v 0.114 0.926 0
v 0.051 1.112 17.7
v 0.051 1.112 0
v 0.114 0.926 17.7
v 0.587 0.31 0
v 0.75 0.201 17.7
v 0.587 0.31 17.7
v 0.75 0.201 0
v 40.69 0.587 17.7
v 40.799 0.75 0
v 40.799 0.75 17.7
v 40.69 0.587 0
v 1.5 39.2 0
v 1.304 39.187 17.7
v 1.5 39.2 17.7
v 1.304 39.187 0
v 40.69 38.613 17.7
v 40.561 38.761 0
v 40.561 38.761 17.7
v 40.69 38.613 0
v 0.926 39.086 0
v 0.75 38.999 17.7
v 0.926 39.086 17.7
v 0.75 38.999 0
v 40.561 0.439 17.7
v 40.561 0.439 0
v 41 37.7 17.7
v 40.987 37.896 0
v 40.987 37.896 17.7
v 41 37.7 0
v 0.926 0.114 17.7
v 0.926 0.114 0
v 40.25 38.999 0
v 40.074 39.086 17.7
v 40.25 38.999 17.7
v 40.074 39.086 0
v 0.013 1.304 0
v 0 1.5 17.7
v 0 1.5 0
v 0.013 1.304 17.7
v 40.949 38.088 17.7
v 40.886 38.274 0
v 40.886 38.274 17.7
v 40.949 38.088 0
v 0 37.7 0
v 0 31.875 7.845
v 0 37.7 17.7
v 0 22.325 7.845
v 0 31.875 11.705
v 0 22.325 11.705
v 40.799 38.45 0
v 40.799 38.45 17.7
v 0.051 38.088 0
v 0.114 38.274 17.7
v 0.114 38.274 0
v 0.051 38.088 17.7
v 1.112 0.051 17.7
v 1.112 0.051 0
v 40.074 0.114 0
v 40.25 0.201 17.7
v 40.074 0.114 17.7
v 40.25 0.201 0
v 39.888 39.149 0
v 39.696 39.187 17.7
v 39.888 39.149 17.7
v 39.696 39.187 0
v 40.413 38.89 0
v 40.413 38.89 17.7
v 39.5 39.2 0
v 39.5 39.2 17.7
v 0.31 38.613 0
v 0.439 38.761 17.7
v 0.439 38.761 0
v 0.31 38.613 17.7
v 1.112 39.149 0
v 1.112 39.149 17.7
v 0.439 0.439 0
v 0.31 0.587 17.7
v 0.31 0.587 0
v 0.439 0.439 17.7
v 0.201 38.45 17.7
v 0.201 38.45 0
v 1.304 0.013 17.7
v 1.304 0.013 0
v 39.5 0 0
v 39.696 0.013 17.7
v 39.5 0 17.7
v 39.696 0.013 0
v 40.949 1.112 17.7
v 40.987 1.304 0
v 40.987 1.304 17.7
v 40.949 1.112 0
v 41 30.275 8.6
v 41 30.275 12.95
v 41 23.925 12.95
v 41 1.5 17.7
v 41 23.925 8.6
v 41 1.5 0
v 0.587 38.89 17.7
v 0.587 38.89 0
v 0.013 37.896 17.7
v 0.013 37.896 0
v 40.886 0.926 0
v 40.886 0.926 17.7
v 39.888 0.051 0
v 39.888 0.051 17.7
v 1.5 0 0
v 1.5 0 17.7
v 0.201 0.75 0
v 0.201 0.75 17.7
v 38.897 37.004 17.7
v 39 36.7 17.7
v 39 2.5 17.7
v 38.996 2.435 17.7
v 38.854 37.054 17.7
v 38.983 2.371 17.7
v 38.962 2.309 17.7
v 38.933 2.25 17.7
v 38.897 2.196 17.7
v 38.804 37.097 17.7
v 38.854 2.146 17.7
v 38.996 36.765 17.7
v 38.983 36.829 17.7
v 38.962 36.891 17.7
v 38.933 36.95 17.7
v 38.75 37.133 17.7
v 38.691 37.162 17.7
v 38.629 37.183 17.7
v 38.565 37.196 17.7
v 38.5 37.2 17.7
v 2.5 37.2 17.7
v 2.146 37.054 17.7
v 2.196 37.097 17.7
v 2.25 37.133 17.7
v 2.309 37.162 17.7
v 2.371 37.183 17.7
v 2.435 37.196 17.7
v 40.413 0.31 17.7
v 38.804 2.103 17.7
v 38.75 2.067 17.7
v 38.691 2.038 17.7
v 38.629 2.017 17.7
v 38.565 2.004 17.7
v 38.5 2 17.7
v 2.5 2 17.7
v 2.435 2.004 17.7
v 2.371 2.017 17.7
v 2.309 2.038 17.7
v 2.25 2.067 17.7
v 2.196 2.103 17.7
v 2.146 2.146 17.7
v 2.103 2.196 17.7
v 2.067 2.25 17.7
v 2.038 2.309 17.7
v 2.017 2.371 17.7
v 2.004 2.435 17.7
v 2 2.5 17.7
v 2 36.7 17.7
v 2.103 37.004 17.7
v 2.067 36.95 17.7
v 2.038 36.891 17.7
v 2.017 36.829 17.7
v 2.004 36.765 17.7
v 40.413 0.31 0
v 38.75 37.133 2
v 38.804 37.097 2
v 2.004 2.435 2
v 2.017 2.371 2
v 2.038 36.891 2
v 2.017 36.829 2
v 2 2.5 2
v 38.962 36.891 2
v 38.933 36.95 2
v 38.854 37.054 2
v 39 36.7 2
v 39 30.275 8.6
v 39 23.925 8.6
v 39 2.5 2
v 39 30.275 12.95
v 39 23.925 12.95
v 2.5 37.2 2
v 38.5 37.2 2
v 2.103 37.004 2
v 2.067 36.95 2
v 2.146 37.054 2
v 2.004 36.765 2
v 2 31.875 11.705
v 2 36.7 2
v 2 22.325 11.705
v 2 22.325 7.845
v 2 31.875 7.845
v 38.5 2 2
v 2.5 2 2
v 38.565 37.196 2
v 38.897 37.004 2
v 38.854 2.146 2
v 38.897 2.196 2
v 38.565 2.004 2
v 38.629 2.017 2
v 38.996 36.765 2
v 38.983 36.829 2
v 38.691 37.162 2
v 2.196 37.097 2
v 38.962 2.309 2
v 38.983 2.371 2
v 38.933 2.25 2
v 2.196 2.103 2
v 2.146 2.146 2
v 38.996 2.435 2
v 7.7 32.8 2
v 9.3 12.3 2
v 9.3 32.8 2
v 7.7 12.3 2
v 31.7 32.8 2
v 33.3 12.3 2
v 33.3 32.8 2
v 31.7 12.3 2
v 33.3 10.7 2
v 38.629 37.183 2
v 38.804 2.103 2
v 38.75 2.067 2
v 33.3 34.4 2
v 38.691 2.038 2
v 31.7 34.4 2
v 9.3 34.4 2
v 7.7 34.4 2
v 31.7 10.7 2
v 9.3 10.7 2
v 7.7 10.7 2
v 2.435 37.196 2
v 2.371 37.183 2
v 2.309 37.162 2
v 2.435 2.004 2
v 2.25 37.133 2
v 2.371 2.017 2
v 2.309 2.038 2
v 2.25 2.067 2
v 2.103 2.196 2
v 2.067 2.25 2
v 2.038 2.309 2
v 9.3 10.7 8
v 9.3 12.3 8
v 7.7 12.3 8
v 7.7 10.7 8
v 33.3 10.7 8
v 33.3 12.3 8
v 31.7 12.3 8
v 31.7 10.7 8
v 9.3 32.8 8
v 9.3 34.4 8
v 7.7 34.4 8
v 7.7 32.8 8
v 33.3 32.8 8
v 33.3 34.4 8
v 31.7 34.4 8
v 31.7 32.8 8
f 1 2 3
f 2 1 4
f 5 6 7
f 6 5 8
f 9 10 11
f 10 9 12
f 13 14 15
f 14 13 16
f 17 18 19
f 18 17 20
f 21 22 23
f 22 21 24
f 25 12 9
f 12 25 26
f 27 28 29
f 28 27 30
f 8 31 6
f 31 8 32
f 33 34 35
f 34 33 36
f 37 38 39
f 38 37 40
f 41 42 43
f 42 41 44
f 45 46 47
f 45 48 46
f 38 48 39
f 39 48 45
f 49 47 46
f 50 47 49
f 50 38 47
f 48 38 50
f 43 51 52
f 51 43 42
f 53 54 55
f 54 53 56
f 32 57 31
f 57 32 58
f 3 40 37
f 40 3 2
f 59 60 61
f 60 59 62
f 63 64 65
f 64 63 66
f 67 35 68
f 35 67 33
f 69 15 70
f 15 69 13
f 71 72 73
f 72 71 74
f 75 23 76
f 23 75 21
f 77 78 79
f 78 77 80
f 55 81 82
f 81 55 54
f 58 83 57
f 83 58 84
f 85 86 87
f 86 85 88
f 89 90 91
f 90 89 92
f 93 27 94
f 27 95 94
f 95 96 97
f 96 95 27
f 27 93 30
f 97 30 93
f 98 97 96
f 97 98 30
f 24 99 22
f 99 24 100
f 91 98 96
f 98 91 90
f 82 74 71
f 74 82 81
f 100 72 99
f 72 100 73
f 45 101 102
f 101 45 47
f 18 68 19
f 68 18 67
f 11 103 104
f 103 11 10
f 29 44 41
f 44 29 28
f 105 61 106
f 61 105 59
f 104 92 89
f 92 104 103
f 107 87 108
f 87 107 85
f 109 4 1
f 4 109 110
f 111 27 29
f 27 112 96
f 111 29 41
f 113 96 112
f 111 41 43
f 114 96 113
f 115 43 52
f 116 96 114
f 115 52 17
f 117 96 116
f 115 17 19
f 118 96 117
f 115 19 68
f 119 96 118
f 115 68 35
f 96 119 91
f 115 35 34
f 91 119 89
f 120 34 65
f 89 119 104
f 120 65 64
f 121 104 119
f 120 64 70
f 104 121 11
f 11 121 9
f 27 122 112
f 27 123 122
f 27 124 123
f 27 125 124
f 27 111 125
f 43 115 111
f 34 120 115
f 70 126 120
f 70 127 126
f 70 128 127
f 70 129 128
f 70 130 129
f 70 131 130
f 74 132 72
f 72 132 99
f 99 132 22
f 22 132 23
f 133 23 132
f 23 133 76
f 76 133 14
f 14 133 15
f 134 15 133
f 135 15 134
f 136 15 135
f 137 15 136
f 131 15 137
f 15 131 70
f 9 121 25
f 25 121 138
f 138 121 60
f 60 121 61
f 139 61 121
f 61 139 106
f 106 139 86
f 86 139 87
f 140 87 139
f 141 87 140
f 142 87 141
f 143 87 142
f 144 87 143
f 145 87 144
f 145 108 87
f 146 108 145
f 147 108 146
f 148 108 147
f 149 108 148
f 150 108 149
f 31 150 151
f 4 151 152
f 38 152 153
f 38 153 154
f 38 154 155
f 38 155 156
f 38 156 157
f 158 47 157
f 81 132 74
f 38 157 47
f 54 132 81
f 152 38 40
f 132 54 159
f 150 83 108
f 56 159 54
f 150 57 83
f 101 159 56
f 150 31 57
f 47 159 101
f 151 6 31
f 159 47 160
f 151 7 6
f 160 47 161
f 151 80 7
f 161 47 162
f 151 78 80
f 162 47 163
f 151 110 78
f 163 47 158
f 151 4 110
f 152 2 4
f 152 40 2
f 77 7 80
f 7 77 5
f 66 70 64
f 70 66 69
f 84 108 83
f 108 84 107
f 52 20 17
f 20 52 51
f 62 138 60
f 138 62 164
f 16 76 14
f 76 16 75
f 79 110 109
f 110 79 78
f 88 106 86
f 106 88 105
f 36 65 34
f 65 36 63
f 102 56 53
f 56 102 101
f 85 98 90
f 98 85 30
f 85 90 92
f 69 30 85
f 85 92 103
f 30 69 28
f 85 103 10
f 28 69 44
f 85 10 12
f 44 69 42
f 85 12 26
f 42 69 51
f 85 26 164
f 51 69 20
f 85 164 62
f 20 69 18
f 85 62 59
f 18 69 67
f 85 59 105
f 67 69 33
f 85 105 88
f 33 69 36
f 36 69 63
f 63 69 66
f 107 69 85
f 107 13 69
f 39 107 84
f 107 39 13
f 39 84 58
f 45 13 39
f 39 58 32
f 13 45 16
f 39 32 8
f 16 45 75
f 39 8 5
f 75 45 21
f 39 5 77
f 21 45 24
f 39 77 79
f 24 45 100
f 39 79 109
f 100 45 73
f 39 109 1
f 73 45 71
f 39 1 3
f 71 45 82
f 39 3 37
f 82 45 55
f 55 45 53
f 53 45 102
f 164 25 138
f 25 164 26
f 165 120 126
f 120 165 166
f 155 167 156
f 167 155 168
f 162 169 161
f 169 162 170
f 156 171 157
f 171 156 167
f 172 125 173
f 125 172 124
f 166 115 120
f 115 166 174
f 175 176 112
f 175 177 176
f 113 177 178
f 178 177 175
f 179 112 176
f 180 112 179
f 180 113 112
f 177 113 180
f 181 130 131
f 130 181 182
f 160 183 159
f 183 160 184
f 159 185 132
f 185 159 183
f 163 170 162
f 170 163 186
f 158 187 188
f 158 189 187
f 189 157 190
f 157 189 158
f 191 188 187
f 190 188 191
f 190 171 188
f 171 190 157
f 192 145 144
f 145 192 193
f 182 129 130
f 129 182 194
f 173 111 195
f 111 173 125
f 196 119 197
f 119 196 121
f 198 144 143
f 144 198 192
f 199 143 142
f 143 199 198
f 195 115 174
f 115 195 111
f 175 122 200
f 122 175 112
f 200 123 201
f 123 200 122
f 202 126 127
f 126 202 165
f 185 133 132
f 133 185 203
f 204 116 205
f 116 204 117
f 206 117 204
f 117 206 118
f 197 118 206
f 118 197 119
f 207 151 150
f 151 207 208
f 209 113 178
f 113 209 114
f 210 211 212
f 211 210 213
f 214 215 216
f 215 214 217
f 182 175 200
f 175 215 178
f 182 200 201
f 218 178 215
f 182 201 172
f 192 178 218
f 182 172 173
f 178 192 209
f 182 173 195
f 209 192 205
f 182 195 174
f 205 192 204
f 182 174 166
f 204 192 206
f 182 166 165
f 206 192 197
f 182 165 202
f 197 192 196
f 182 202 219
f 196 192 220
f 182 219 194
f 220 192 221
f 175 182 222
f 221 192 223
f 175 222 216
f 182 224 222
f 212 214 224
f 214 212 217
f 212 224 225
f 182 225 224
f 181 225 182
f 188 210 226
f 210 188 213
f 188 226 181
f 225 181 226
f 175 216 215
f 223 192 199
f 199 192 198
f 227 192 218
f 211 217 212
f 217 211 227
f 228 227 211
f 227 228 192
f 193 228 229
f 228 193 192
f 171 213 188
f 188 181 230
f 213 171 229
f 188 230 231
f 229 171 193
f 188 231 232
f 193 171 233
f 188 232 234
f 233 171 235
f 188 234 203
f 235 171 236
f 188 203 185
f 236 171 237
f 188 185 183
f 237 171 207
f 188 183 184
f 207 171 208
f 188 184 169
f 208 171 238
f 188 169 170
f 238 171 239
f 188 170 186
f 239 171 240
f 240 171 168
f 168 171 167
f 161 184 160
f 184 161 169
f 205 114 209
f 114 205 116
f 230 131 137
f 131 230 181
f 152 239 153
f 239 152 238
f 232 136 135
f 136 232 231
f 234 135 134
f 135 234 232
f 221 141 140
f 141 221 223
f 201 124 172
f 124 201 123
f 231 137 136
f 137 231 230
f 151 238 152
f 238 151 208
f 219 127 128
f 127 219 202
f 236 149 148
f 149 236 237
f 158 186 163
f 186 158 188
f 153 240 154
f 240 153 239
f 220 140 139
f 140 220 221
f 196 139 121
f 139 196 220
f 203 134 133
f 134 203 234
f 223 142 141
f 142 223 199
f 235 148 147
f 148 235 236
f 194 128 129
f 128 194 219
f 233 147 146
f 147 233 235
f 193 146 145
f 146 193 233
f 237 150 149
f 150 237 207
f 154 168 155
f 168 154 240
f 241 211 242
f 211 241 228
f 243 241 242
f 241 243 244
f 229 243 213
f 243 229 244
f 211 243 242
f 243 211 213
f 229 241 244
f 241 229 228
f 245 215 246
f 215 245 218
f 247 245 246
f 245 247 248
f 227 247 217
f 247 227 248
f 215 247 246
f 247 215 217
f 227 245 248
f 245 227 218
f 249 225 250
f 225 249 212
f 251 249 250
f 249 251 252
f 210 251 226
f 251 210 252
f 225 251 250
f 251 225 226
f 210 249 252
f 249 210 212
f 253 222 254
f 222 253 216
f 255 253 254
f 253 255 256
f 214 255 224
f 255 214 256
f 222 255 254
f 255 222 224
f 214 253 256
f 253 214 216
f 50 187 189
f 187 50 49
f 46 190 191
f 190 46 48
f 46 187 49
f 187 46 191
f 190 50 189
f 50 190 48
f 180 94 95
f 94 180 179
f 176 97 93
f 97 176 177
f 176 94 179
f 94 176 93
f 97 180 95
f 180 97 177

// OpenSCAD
// file: env-sensor-case.scad
// ENV sensor enclosure - common geometry for both variants.
//
// Do not edit the numbers here. Every dimension comes from params-<variant>.scad,
// which tools/boardgen/enclosure.py generates from the board model, so the case
// cannot drift away from the PCB it is meant to hold.
//
//   openscad -D 'part="base"' -o case-a-base.stl mechanical/case-a.scad
//   openscad -D 'part="lid"'  -o case-a-lid.stl  mechanical/case-a.scad
//
// The enclosure is part of the instrument: on Variant B the dividing wall at the
// neck and the vents over the island are what the thermal model's convection
// term actually depends on. See docs/45-thermal-model.md.

part = "base";      // "base" | "lid" | "both"
$fn = 48;

eps = 0.01;

// board position inside the cavity
bx = wall + (inner_w - board_w) / 2;
by = wall + (inner_h - board_h) / 2;
bz = floor_t + board_z;

module rrect(w, h, r) {
    hull() for (x = [r, w - r], y = [r, h - r]) translate([x, y]) circle(r);
}

module shell(height, r) {
    linear_extrude(height) rrect(outer_w, outer_h, r);
}

module cavity(height) {
    translate([wall, wall, 0])
        linear_extrude(height) rrect(inner_w, inner_h, max(0.5, fillet - wall));
}

// ---- cut-outs -------------------------------------------------------------
module wall_cutout(w, centre, cw, ch, z) {
    // `centre` is in board coordinates along the wall
    zz = bz + board_t + z;
    if (w == "left")
        translate([-eps, by + centre - cw / 2, zz - ch / 2])
            cube([wall + 2 * eps, cw, ch + tol]);
    else if (w == "right")
        translate([outer_w - wall - eps, by + centre - cw / 2, zz - ch / 2])
            cube([wall + 2 * eps, cw, ch + tol]);
    else if (w == "top")
        translate([bx + centre - cw / 2, -eps, zz - ch / 2])
            cube([cw, wall + 2 * eps, ch + tol]);
    else if (w == "bottom")
        translate([bx + centre - cw / 2, outer_h - wall - eps, zz - ch / 2])
            cube([cw, wall + 2 * eps, ch + tol]);
}

module lid_cutout(centre_x, d) {
    translate([bx + centre_x, by + inner_h / 2, -eps])
        cylinder(d = d, h = lid_t + 2 * eps);
}

module vent_slots() {
    for (v = vents)
        translate([bx + v[0], by + v[1], -eps])
            cube([v[2], v[3], lid_t + 2 * eps]);
}

// ---- support --------------------------------------------------------------
module ribs() {
    // Four short ribs under the board corners, kept out of the antenna
    // keep-out so nothing dense sits behind the antenna (M-04).
    ay1 = antenna_keepout[3];
    for (p = [[3, ay1 + 3], [board_w - 3, ay1 + 3],
              [3, board_h - 3], [board_w - 3, board_h - 3]])
        translate([bx + p[0] - rib_w / 2, by + p[1] - rib_w / 2, floor_t])
            cube([rib_w, rib_w, board_z]);
}

module divider() {
    // Variant B only: the wall between the electronics chamber and the sensor
    // chamber, with a slot for the PCB neck to pass through.
    if (divider_y > 0) {
        difference() {
            translate([wall, by + divider_y - wall / 2, floor_t])
                cube([inner_w, wall, inner_z]);
            translate([bx + board_w / 2 - neck_slot[0] / 2,
                       by + divider_y - wall / 2 - eps,
                       bz - tol])
                cube([neck_slot[0], wall + 2 * eps, neck_slot[1]]);
        }
    }
}

// ---- parts ----------------------------------------------------------------
module base() {
    difference() {
        union() {
            difference() {
                shell(floor_t + inner_z, fillet);
                translate([0, 0, floor_t]) cavity(inner_z + eps);
            }
            ribs();
            divider();
        }
        for (c = cutouts)
            if (c[0] != "lid") wall_cutout(c[0], c[1], c[2], c[3], c[4]);
        // battery bay is simply the space under the board; nothing to cut,
        // but mark it so the model documents itself in the preview
    }
}

module lid() {
    difference() {
        union() {
            linear_extrude(lid_t) rrect(outer_w, outer_h, fillet);
            // lip that locates the lid in the cavity
            translate([wall + 0.3, wall + 0.3, lid_t])
                linear_extrude(1.2)
                    rrect(inner_w - 0.6, inner_h - 0.6, max(0.5, fillet - wall));
        }
        vent_slots();
        for (c = cutouts)
            if (c[0] == "lid") lid_cutout(c[1], c[2]);
    }
}

if (part == "base") base();
else if (part == "lid") lid();
else { base(); translate([0, outer_h + 5, 0]) lid(); }
// file: params-a.scad
// Generated by tools/boardgen/enclosure.py for variant A (Compact). Do not edit.
variant = "a";
board_w = 30.0; board_h = 34.0; board_t = 1.6;
wall = 2.0; floor_t = 2.0; lid_t = 2.0;
clear_xy = 0.6; fillet = 1.5; tol = 0.35;
rib_w = 1.6;
inner_w = 37.0; inner_h = 35.2; inner_z = 15.7;
board_z = 6.0; top_clear = 8.1;
outer_w = 41.0; outer_h = 39.2; outer_z = 19.7;
batt = [35.0, 30.0, 5.0];
// battery bay in BOARD coordinates; it may extend past the
// board edge, because the cavity is sized to the cell, not the PCB
batt_bay = [-2.5, 6.9, 32.5, 28.299999999999997];
divider_y = -1;
neck_slot = [0, 0];
antenna_keepout = [0.0, 0.0, 30.0, 5.9];
// [x, y, w, h] on the board, in board coordinates
vents = [[12.0, 30.299999999999997, 8.0, 1.2]];
// [wall, centre, width, height, z]
cutouts = [["left", 24.5, 9.549999999999999, 3.5100000000000002, 0.0], ["right", 24.5, 6.35, 4.0, 1.0], ["lid", 13.7, 4.0, 4.0, 0.0], ["lid", 11.3, 2.0, 2.0, 0.0]];
board_outline = [[0, 0], [30.0, 0], [30.0, 34.0], [0, 34.0]];
// main file
// Generated wrapper for variant A. Edit env-sensor-case.scad or the generator, not this file.
include <params-a.scad>
include <env-sensor-case.scad>
